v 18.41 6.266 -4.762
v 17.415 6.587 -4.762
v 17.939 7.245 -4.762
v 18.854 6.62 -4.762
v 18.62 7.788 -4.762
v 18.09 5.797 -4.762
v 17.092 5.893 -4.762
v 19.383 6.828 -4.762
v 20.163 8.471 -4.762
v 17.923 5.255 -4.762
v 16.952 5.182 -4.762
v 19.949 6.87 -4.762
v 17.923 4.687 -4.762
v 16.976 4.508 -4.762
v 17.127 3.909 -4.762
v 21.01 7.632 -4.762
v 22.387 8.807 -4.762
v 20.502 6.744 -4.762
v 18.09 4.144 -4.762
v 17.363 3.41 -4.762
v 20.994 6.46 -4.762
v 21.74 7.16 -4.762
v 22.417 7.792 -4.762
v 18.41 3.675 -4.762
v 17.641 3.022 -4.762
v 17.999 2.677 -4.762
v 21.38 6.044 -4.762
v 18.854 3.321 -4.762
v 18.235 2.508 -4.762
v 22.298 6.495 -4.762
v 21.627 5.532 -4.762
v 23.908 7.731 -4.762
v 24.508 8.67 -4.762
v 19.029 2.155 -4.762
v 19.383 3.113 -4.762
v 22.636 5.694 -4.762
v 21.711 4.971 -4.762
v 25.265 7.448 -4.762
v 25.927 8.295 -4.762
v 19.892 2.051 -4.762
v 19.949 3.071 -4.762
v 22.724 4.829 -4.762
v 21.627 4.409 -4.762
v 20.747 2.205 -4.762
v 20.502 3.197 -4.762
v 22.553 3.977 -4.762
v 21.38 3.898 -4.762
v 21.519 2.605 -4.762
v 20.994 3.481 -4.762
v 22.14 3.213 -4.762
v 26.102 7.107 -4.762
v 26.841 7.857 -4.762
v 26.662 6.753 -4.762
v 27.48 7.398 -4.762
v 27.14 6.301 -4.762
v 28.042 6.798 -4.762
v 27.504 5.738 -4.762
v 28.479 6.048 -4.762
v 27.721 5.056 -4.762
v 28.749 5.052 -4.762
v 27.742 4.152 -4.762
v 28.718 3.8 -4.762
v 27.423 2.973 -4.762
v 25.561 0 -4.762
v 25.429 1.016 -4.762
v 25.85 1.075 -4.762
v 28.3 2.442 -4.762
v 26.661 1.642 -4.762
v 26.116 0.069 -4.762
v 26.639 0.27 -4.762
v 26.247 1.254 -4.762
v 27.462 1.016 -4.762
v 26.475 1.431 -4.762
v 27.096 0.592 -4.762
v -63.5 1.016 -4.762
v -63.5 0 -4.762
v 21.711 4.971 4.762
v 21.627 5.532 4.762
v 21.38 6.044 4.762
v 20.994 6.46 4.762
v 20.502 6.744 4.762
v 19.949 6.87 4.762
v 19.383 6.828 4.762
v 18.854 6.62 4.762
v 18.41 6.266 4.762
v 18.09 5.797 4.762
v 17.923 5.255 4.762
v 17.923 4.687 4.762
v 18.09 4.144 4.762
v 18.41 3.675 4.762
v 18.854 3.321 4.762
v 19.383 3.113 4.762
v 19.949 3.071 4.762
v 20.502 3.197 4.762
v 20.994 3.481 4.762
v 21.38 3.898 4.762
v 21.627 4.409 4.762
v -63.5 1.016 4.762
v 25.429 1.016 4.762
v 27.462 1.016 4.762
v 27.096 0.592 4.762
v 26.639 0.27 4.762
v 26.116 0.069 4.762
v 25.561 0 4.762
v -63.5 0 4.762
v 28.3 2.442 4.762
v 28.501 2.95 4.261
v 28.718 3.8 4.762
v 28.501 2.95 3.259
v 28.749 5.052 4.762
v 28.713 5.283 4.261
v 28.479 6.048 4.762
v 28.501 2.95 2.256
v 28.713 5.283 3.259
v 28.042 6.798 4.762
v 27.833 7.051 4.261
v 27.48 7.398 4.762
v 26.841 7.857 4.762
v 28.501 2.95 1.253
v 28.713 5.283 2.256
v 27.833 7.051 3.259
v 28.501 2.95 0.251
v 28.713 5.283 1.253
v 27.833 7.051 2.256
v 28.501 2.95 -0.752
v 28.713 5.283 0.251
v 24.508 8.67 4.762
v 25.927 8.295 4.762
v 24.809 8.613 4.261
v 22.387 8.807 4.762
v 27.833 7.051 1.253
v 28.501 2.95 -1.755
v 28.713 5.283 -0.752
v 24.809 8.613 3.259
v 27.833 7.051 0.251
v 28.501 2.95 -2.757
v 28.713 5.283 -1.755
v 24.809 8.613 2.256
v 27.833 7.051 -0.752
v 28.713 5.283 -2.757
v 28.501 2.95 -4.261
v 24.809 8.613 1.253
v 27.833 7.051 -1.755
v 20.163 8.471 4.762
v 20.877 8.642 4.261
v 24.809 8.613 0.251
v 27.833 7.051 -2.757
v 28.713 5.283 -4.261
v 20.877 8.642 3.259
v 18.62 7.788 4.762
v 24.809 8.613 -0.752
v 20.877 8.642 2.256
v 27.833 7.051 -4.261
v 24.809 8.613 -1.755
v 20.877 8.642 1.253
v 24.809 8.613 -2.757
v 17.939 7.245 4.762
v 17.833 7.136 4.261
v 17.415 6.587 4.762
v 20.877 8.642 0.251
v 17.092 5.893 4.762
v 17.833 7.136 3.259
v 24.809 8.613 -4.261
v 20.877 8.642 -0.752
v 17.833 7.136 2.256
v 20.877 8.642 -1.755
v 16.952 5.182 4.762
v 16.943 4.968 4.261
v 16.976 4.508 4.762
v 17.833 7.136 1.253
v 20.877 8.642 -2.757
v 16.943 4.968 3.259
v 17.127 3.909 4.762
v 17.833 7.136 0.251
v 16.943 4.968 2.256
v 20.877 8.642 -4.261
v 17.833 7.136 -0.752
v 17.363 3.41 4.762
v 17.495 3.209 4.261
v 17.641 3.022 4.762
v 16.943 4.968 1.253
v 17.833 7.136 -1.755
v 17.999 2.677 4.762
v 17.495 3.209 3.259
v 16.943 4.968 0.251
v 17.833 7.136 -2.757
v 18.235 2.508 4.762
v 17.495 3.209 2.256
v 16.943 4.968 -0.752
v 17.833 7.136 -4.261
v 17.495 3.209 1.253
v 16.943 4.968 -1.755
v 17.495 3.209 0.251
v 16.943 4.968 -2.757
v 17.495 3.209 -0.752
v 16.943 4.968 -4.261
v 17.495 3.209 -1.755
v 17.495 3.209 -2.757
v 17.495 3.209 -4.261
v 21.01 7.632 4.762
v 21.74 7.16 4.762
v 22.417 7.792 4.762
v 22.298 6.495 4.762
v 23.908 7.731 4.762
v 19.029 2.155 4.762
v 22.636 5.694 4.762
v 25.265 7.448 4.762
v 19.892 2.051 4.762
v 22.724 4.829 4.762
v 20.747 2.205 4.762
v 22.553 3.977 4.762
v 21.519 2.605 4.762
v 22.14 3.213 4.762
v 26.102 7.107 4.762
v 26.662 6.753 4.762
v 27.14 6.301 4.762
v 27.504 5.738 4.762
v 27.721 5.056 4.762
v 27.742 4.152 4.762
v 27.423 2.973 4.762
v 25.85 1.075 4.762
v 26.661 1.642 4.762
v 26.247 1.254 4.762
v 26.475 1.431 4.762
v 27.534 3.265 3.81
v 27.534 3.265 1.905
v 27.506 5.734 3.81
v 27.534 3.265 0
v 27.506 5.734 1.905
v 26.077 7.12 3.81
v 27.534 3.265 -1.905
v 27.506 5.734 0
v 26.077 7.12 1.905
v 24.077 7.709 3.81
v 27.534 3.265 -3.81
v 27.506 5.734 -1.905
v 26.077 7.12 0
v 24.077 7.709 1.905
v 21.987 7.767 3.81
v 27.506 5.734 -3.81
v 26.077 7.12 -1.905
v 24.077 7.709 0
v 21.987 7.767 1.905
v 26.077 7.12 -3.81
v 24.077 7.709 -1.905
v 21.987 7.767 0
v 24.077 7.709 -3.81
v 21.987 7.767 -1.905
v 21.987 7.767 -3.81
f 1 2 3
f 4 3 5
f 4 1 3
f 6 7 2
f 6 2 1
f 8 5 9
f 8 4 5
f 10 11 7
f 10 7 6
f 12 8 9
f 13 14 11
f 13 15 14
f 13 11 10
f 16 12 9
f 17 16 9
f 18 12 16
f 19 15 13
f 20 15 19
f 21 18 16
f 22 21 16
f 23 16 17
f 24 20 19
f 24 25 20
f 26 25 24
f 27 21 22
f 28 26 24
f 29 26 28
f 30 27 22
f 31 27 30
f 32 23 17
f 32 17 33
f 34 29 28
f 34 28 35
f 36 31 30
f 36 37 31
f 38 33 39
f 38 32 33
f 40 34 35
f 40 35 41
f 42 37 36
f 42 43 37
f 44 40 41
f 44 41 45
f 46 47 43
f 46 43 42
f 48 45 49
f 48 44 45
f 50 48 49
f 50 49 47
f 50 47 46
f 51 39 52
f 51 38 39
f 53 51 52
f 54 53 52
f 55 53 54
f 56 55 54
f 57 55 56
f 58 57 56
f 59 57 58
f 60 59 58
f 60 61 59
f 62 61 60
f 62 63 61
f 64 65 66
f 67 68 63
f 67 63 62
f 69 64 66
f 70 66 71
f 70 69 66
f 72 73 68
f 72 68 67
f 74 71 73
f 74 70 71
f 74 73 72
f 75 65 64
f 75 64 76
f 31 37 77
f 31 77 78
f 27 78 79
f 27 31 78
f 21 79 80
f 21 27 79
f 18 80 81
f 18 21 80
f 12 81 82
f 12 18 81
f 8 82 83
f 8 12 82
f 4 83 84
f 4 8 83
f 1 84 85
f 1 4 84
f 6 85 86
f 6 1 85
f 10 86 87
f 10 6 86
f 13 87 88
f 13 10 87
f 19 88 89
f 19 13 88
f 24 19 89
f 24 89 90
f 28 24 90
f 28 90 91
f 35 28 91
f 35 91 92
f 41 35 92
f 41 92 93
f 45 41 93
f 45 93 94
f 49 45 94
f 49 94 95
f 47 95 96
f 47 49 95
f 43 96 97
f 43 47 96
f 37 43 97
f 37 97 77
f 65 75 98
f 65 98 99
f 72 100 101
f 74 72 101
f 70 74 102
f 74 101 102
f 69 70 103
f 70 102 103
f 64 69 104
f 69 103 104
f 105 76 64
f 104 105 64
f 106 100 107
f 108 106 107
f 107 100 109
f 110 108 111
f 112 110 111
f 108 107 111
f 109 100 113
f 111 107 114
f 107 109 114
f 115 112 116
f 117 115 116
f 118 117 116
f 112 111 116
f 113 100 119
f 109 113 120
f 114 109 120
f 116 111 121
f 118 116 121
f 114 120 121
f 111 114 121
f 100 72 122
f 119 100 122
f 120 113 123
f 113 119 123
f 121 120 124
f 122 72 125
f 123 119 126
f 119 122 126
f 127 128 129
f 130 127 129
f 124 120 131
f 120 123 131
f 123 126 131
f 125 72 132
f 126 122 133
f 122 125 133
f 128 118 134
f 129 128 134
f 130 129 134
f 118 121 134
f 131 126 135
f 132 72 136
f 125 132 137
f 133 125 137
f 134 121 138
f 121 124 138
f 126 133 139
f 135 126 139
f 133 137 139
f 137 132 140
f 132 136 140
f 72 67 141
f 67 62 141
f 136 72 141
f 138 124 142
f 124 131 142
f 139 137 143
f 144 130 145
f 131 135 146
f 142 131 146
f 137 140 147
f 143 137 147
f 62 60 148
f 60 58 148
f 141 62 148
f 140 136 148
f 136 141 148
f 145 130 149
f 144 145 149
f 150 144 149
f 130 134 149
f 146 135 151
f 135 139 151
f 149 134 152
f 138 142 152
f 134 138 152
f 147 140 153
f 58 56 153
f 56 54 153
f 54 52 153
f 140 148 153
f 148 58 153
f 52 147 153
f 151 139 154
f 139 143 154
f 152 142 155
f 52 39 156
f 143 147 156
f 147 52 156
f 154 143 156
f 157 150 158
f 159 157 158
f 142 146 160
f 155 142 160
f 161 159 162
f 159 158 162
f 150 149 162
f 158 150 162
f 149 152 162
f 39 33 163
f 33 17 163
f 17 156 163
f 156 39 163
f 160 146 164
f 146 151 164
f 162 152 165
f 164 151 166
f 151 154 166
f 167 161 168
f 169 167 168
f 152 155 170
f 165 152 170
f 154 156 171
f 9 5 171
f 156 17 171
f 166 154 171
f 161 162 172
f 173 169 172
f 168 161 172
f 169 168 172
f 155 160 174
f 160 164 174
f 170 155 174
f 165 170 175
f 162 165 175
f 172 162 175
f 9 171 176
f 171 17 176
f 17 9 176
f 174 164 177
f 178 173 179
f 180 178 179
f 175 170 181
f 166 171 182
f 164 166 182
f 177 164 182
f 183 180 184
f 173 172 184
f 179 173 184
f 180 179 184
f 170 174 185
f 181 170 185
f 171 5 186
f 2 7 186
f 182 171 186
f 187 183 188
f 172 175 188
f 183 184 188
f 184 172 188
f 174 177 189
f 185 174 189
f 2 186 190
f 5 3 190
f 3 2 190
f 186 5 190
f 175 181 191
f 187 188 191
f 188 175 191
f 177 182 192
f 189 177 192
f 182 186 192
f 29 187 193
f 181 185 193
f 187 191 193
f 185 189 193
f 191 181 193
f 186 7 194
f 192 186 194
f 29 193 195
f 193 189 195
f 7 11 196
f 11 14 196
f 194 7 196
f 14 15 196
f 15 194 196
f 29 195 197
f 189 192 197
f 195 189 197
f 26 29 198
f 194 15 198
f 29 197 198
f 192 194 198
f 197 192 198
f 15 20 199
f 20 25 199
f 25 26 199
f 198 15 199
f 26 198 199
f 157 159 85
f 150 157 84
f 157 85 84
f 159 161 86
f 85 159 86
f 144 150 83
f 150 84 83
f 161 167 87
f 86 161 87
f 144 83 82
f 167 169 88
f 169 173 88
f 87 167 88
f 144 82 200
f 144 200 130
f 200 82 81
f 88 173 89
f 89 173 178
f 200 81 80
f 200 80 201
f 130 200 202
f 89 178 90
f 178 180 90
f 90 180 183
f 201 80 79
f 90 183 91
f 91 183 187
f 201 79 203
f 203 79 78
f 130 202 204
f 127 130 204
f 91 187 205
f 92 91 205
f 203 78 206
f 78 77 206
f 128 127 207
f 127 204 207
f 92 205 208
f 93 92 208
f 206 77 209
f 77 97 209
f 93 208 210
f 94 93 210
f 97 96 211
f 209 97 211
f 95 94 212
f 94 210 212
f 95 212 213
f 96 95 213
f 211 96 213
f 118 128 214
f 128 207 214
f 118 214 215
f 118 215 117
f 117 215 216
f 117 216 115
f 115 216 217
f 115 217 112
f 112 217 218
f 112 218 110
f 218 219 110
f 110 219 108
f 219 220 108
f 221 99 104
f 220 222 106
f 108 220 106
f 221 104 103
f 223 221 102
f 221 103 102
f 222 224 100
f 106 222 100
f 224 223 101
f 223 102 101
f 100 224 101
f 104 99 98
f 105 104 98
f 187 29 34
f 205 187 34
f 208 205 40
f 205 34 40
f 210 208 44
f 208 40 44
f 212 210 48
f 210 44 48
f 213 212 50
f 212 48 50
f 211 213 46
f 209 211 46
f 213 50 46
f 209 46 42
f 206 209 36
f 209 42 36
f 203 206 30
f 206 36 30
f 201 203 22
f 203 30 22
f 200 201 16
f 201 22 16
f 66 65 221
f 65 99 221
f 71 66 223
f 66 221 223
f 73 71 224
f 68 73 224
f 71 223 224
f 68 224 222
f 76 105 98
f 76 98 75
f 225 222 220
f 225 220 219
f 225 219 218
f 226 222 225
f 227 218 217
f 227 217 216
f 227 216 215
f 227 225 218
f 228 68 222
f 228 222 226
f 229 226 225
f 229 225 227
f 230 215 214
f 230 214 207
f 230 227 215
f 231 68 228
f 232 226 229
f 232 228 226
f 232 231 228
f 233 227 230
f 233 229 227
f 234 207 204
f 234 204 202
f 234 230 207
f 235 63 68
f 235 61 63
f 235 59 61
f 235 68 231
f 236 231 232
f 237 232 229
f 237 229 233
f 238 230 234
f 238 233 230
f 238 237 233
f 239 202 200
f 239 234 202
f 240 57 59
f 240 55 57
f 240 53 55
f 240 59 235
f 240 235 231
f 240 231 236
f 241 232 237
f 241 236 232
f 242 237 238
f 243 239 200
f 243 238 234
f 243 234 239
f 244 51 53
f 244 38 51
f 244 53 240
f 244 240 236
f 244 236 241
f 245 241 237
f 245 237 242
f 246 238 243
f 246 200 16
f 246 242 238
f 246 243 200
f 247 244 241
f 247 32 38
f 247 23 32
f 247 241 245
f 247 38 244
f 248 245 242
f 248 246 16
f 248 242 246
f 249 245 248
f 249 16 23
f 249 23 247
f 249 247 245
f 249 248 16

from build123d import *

# Parameters (mm, degrees)
SKETCH1_W               = 127
SKETCH1_H               = 9.525
BOSS_EXTRUDE1_DEPTH     = 1.016
BOSS_EXTRUDE6_START     = -9.525
BOSS_EXTRUDE6_OUTLINE_R = 1.905
BOSS_EXTRUDE6_DEPTH     = 9.525
SKETCH9_W               = 36.03828532
SKETCH9_H               = 1.016
CUT_EXTRUDE1_DEPTH      = 65.812462184
FILLET1_R               = 1.524
FILLET2_R               = 2.286


# Read off the part's stored shape, not the designer's step: Boss-Extrude6
with BuildPart() as part:
    # Sketch1 → Boss-Extrude1 (new body)
    with BuildSketch(Plane(origin=(0, 0, 0), x_dir=(1, 0, 0), z_dir=(0, 1, 0))):
        Rectangle(SKETCH1_W, SKETCH1_H)
    extrude(amount=BOSS_EXTRUDE1_DEPTH)

    # Boss-Extrude6 outline → Boss-Extrude6 (add)
    with BuildSketch(Plane.XY.offset(4.7625).offset(BOSS_EXTRUDE6_START)):
        with BuildLine():
            add(Edge.make_bspline(
                [(26.156419395, 1.016), (27.757434641, 2.825849187), (28.350180328, 4.564407662), (28.120667146, 5.896063841), (27.39467414, 6.780008349), (26.424210355, 7.324865414), (25.33727298, 7.653728665), (24.19871737, 7.837160052), (23.061378829, 7.895254529), (21.981011381, 7.826483038), (21.009951357, 7.632249789)],
                knots=[0, 0, 0, 0, 0, 0, 0, 0, 0, 0, 0, 0.472115693, 0.472115693, 0.472115693, 0.472115693, 0.472115693, 0.472115693, 0.472115693, 0.472115693, 0.472115693, 0.472115693, 0.472115693], degree=10))
            Line((26.156419395, 1.016), (27.46171468, 1.016))
            add(Edge.make_bspline(
                [(27.46171468, 1.016), (27.623905569, 1.236289395), (28.056884434, 1.889074198), (28.557724419, 2.962290085), (28.8172552, 4.180611411), (28.76040826, 5.30661561), (28.416603121, 6.290511823), (27.666181069, 7.348770574), (26.417551122, 8.178142562), (24.81092103, 8.664788271), (22.918485913, 8.872514854), (21.352995968, 8.76504205), (19.444164003, 8.313268155), (17.998494366, 7.538133432), (17.083415516, 6.10416322), (16.87715717, 4.944774701), (17.068356899, 3.924752178), (17.486556032, 3.160303311), (17.876833308, 2.766163414), (18.127748015, 2.578126084), (18.193760769, 2.534731904), (18.235229403, 2.508279507)],
                knots=[0.015823115, 0.015823115, 0.015823115, 0.015823115, 0.03125, 0.0625, 0.09375, 0.125, 0.15625, 0.1875, 0.25, 0.3125, 0.375, 0.469264357, 0.500514357, 0.625, 0.6875, 0.75, 0.8125, 0.875, 0.9375, 0.96875, 1, 1, 1, 1], degree=3))
            ThreePointArc((18.235229403, 2.508279507), (22.374991172, 3.579790176), (21.009951357, 7.632249789))
        make_face()
        with Locations((19.806419395, 4.970717934)):
            Circle(BOSS_EXTRUDE6_OUTLINE_R, mode=Mode.SUBTRACT)
    extrude(amount=BOSS_EXTRUDE6_DEPTH)

    # Sketch9 → Cut-Extrude1 (cut, through all)
    with BuildSketch(Plane.XY.offset(4.7625)):
        with Locations((45.48085734, 0.508)):
            Rectangle(SKETCH9_W, SKETCH9_H)
    extrude(amount=-CUT_EXTRUDE1_DEPTH, mode=Mode.SUBTRACT)

    # Fillet1
    fillet1_edges = [part.edges().sort_by_distance(p)[0] for p in [
        (26.156419395, 1.016, 0),
    ]]
    fillet(fillet1_edges, radius=FILLET1_R)

    # Fillet2
    # the kernel refuses this fillet: 2.286 mm, written as the material it takes off along each edge
    with BuildSketch(Plane(origin=(27.46171468, 0, 9.51440488), x_dir=(4.5999599579907773e-10, 1.0, 0), z_dir=(0, 0, -1))) as fillet2_piece_1:
        with BuildLine():
            CenterArc((2.285999999, -1.900761953), FILLET2_R, 123.748988569, 56.251011404)
            Line((-1e-09, -1.900761952), (-0.045720001, -1.900761952))
            Line((-0.045720001, -1.900761952), (-0.04572, 0))
            Line((-0.04572, 0), (0, 0.04572))
            ThreePointArc((0, 0.04572), (0.508, 0.04572), (0.9906, 0.038015239))
            Line((0.9906, 0.038015239), (1.016, 0))
        make_face()
    extrude(amount=19.02880976, mode=Mode.SUBTRACT)


solid = part.part
